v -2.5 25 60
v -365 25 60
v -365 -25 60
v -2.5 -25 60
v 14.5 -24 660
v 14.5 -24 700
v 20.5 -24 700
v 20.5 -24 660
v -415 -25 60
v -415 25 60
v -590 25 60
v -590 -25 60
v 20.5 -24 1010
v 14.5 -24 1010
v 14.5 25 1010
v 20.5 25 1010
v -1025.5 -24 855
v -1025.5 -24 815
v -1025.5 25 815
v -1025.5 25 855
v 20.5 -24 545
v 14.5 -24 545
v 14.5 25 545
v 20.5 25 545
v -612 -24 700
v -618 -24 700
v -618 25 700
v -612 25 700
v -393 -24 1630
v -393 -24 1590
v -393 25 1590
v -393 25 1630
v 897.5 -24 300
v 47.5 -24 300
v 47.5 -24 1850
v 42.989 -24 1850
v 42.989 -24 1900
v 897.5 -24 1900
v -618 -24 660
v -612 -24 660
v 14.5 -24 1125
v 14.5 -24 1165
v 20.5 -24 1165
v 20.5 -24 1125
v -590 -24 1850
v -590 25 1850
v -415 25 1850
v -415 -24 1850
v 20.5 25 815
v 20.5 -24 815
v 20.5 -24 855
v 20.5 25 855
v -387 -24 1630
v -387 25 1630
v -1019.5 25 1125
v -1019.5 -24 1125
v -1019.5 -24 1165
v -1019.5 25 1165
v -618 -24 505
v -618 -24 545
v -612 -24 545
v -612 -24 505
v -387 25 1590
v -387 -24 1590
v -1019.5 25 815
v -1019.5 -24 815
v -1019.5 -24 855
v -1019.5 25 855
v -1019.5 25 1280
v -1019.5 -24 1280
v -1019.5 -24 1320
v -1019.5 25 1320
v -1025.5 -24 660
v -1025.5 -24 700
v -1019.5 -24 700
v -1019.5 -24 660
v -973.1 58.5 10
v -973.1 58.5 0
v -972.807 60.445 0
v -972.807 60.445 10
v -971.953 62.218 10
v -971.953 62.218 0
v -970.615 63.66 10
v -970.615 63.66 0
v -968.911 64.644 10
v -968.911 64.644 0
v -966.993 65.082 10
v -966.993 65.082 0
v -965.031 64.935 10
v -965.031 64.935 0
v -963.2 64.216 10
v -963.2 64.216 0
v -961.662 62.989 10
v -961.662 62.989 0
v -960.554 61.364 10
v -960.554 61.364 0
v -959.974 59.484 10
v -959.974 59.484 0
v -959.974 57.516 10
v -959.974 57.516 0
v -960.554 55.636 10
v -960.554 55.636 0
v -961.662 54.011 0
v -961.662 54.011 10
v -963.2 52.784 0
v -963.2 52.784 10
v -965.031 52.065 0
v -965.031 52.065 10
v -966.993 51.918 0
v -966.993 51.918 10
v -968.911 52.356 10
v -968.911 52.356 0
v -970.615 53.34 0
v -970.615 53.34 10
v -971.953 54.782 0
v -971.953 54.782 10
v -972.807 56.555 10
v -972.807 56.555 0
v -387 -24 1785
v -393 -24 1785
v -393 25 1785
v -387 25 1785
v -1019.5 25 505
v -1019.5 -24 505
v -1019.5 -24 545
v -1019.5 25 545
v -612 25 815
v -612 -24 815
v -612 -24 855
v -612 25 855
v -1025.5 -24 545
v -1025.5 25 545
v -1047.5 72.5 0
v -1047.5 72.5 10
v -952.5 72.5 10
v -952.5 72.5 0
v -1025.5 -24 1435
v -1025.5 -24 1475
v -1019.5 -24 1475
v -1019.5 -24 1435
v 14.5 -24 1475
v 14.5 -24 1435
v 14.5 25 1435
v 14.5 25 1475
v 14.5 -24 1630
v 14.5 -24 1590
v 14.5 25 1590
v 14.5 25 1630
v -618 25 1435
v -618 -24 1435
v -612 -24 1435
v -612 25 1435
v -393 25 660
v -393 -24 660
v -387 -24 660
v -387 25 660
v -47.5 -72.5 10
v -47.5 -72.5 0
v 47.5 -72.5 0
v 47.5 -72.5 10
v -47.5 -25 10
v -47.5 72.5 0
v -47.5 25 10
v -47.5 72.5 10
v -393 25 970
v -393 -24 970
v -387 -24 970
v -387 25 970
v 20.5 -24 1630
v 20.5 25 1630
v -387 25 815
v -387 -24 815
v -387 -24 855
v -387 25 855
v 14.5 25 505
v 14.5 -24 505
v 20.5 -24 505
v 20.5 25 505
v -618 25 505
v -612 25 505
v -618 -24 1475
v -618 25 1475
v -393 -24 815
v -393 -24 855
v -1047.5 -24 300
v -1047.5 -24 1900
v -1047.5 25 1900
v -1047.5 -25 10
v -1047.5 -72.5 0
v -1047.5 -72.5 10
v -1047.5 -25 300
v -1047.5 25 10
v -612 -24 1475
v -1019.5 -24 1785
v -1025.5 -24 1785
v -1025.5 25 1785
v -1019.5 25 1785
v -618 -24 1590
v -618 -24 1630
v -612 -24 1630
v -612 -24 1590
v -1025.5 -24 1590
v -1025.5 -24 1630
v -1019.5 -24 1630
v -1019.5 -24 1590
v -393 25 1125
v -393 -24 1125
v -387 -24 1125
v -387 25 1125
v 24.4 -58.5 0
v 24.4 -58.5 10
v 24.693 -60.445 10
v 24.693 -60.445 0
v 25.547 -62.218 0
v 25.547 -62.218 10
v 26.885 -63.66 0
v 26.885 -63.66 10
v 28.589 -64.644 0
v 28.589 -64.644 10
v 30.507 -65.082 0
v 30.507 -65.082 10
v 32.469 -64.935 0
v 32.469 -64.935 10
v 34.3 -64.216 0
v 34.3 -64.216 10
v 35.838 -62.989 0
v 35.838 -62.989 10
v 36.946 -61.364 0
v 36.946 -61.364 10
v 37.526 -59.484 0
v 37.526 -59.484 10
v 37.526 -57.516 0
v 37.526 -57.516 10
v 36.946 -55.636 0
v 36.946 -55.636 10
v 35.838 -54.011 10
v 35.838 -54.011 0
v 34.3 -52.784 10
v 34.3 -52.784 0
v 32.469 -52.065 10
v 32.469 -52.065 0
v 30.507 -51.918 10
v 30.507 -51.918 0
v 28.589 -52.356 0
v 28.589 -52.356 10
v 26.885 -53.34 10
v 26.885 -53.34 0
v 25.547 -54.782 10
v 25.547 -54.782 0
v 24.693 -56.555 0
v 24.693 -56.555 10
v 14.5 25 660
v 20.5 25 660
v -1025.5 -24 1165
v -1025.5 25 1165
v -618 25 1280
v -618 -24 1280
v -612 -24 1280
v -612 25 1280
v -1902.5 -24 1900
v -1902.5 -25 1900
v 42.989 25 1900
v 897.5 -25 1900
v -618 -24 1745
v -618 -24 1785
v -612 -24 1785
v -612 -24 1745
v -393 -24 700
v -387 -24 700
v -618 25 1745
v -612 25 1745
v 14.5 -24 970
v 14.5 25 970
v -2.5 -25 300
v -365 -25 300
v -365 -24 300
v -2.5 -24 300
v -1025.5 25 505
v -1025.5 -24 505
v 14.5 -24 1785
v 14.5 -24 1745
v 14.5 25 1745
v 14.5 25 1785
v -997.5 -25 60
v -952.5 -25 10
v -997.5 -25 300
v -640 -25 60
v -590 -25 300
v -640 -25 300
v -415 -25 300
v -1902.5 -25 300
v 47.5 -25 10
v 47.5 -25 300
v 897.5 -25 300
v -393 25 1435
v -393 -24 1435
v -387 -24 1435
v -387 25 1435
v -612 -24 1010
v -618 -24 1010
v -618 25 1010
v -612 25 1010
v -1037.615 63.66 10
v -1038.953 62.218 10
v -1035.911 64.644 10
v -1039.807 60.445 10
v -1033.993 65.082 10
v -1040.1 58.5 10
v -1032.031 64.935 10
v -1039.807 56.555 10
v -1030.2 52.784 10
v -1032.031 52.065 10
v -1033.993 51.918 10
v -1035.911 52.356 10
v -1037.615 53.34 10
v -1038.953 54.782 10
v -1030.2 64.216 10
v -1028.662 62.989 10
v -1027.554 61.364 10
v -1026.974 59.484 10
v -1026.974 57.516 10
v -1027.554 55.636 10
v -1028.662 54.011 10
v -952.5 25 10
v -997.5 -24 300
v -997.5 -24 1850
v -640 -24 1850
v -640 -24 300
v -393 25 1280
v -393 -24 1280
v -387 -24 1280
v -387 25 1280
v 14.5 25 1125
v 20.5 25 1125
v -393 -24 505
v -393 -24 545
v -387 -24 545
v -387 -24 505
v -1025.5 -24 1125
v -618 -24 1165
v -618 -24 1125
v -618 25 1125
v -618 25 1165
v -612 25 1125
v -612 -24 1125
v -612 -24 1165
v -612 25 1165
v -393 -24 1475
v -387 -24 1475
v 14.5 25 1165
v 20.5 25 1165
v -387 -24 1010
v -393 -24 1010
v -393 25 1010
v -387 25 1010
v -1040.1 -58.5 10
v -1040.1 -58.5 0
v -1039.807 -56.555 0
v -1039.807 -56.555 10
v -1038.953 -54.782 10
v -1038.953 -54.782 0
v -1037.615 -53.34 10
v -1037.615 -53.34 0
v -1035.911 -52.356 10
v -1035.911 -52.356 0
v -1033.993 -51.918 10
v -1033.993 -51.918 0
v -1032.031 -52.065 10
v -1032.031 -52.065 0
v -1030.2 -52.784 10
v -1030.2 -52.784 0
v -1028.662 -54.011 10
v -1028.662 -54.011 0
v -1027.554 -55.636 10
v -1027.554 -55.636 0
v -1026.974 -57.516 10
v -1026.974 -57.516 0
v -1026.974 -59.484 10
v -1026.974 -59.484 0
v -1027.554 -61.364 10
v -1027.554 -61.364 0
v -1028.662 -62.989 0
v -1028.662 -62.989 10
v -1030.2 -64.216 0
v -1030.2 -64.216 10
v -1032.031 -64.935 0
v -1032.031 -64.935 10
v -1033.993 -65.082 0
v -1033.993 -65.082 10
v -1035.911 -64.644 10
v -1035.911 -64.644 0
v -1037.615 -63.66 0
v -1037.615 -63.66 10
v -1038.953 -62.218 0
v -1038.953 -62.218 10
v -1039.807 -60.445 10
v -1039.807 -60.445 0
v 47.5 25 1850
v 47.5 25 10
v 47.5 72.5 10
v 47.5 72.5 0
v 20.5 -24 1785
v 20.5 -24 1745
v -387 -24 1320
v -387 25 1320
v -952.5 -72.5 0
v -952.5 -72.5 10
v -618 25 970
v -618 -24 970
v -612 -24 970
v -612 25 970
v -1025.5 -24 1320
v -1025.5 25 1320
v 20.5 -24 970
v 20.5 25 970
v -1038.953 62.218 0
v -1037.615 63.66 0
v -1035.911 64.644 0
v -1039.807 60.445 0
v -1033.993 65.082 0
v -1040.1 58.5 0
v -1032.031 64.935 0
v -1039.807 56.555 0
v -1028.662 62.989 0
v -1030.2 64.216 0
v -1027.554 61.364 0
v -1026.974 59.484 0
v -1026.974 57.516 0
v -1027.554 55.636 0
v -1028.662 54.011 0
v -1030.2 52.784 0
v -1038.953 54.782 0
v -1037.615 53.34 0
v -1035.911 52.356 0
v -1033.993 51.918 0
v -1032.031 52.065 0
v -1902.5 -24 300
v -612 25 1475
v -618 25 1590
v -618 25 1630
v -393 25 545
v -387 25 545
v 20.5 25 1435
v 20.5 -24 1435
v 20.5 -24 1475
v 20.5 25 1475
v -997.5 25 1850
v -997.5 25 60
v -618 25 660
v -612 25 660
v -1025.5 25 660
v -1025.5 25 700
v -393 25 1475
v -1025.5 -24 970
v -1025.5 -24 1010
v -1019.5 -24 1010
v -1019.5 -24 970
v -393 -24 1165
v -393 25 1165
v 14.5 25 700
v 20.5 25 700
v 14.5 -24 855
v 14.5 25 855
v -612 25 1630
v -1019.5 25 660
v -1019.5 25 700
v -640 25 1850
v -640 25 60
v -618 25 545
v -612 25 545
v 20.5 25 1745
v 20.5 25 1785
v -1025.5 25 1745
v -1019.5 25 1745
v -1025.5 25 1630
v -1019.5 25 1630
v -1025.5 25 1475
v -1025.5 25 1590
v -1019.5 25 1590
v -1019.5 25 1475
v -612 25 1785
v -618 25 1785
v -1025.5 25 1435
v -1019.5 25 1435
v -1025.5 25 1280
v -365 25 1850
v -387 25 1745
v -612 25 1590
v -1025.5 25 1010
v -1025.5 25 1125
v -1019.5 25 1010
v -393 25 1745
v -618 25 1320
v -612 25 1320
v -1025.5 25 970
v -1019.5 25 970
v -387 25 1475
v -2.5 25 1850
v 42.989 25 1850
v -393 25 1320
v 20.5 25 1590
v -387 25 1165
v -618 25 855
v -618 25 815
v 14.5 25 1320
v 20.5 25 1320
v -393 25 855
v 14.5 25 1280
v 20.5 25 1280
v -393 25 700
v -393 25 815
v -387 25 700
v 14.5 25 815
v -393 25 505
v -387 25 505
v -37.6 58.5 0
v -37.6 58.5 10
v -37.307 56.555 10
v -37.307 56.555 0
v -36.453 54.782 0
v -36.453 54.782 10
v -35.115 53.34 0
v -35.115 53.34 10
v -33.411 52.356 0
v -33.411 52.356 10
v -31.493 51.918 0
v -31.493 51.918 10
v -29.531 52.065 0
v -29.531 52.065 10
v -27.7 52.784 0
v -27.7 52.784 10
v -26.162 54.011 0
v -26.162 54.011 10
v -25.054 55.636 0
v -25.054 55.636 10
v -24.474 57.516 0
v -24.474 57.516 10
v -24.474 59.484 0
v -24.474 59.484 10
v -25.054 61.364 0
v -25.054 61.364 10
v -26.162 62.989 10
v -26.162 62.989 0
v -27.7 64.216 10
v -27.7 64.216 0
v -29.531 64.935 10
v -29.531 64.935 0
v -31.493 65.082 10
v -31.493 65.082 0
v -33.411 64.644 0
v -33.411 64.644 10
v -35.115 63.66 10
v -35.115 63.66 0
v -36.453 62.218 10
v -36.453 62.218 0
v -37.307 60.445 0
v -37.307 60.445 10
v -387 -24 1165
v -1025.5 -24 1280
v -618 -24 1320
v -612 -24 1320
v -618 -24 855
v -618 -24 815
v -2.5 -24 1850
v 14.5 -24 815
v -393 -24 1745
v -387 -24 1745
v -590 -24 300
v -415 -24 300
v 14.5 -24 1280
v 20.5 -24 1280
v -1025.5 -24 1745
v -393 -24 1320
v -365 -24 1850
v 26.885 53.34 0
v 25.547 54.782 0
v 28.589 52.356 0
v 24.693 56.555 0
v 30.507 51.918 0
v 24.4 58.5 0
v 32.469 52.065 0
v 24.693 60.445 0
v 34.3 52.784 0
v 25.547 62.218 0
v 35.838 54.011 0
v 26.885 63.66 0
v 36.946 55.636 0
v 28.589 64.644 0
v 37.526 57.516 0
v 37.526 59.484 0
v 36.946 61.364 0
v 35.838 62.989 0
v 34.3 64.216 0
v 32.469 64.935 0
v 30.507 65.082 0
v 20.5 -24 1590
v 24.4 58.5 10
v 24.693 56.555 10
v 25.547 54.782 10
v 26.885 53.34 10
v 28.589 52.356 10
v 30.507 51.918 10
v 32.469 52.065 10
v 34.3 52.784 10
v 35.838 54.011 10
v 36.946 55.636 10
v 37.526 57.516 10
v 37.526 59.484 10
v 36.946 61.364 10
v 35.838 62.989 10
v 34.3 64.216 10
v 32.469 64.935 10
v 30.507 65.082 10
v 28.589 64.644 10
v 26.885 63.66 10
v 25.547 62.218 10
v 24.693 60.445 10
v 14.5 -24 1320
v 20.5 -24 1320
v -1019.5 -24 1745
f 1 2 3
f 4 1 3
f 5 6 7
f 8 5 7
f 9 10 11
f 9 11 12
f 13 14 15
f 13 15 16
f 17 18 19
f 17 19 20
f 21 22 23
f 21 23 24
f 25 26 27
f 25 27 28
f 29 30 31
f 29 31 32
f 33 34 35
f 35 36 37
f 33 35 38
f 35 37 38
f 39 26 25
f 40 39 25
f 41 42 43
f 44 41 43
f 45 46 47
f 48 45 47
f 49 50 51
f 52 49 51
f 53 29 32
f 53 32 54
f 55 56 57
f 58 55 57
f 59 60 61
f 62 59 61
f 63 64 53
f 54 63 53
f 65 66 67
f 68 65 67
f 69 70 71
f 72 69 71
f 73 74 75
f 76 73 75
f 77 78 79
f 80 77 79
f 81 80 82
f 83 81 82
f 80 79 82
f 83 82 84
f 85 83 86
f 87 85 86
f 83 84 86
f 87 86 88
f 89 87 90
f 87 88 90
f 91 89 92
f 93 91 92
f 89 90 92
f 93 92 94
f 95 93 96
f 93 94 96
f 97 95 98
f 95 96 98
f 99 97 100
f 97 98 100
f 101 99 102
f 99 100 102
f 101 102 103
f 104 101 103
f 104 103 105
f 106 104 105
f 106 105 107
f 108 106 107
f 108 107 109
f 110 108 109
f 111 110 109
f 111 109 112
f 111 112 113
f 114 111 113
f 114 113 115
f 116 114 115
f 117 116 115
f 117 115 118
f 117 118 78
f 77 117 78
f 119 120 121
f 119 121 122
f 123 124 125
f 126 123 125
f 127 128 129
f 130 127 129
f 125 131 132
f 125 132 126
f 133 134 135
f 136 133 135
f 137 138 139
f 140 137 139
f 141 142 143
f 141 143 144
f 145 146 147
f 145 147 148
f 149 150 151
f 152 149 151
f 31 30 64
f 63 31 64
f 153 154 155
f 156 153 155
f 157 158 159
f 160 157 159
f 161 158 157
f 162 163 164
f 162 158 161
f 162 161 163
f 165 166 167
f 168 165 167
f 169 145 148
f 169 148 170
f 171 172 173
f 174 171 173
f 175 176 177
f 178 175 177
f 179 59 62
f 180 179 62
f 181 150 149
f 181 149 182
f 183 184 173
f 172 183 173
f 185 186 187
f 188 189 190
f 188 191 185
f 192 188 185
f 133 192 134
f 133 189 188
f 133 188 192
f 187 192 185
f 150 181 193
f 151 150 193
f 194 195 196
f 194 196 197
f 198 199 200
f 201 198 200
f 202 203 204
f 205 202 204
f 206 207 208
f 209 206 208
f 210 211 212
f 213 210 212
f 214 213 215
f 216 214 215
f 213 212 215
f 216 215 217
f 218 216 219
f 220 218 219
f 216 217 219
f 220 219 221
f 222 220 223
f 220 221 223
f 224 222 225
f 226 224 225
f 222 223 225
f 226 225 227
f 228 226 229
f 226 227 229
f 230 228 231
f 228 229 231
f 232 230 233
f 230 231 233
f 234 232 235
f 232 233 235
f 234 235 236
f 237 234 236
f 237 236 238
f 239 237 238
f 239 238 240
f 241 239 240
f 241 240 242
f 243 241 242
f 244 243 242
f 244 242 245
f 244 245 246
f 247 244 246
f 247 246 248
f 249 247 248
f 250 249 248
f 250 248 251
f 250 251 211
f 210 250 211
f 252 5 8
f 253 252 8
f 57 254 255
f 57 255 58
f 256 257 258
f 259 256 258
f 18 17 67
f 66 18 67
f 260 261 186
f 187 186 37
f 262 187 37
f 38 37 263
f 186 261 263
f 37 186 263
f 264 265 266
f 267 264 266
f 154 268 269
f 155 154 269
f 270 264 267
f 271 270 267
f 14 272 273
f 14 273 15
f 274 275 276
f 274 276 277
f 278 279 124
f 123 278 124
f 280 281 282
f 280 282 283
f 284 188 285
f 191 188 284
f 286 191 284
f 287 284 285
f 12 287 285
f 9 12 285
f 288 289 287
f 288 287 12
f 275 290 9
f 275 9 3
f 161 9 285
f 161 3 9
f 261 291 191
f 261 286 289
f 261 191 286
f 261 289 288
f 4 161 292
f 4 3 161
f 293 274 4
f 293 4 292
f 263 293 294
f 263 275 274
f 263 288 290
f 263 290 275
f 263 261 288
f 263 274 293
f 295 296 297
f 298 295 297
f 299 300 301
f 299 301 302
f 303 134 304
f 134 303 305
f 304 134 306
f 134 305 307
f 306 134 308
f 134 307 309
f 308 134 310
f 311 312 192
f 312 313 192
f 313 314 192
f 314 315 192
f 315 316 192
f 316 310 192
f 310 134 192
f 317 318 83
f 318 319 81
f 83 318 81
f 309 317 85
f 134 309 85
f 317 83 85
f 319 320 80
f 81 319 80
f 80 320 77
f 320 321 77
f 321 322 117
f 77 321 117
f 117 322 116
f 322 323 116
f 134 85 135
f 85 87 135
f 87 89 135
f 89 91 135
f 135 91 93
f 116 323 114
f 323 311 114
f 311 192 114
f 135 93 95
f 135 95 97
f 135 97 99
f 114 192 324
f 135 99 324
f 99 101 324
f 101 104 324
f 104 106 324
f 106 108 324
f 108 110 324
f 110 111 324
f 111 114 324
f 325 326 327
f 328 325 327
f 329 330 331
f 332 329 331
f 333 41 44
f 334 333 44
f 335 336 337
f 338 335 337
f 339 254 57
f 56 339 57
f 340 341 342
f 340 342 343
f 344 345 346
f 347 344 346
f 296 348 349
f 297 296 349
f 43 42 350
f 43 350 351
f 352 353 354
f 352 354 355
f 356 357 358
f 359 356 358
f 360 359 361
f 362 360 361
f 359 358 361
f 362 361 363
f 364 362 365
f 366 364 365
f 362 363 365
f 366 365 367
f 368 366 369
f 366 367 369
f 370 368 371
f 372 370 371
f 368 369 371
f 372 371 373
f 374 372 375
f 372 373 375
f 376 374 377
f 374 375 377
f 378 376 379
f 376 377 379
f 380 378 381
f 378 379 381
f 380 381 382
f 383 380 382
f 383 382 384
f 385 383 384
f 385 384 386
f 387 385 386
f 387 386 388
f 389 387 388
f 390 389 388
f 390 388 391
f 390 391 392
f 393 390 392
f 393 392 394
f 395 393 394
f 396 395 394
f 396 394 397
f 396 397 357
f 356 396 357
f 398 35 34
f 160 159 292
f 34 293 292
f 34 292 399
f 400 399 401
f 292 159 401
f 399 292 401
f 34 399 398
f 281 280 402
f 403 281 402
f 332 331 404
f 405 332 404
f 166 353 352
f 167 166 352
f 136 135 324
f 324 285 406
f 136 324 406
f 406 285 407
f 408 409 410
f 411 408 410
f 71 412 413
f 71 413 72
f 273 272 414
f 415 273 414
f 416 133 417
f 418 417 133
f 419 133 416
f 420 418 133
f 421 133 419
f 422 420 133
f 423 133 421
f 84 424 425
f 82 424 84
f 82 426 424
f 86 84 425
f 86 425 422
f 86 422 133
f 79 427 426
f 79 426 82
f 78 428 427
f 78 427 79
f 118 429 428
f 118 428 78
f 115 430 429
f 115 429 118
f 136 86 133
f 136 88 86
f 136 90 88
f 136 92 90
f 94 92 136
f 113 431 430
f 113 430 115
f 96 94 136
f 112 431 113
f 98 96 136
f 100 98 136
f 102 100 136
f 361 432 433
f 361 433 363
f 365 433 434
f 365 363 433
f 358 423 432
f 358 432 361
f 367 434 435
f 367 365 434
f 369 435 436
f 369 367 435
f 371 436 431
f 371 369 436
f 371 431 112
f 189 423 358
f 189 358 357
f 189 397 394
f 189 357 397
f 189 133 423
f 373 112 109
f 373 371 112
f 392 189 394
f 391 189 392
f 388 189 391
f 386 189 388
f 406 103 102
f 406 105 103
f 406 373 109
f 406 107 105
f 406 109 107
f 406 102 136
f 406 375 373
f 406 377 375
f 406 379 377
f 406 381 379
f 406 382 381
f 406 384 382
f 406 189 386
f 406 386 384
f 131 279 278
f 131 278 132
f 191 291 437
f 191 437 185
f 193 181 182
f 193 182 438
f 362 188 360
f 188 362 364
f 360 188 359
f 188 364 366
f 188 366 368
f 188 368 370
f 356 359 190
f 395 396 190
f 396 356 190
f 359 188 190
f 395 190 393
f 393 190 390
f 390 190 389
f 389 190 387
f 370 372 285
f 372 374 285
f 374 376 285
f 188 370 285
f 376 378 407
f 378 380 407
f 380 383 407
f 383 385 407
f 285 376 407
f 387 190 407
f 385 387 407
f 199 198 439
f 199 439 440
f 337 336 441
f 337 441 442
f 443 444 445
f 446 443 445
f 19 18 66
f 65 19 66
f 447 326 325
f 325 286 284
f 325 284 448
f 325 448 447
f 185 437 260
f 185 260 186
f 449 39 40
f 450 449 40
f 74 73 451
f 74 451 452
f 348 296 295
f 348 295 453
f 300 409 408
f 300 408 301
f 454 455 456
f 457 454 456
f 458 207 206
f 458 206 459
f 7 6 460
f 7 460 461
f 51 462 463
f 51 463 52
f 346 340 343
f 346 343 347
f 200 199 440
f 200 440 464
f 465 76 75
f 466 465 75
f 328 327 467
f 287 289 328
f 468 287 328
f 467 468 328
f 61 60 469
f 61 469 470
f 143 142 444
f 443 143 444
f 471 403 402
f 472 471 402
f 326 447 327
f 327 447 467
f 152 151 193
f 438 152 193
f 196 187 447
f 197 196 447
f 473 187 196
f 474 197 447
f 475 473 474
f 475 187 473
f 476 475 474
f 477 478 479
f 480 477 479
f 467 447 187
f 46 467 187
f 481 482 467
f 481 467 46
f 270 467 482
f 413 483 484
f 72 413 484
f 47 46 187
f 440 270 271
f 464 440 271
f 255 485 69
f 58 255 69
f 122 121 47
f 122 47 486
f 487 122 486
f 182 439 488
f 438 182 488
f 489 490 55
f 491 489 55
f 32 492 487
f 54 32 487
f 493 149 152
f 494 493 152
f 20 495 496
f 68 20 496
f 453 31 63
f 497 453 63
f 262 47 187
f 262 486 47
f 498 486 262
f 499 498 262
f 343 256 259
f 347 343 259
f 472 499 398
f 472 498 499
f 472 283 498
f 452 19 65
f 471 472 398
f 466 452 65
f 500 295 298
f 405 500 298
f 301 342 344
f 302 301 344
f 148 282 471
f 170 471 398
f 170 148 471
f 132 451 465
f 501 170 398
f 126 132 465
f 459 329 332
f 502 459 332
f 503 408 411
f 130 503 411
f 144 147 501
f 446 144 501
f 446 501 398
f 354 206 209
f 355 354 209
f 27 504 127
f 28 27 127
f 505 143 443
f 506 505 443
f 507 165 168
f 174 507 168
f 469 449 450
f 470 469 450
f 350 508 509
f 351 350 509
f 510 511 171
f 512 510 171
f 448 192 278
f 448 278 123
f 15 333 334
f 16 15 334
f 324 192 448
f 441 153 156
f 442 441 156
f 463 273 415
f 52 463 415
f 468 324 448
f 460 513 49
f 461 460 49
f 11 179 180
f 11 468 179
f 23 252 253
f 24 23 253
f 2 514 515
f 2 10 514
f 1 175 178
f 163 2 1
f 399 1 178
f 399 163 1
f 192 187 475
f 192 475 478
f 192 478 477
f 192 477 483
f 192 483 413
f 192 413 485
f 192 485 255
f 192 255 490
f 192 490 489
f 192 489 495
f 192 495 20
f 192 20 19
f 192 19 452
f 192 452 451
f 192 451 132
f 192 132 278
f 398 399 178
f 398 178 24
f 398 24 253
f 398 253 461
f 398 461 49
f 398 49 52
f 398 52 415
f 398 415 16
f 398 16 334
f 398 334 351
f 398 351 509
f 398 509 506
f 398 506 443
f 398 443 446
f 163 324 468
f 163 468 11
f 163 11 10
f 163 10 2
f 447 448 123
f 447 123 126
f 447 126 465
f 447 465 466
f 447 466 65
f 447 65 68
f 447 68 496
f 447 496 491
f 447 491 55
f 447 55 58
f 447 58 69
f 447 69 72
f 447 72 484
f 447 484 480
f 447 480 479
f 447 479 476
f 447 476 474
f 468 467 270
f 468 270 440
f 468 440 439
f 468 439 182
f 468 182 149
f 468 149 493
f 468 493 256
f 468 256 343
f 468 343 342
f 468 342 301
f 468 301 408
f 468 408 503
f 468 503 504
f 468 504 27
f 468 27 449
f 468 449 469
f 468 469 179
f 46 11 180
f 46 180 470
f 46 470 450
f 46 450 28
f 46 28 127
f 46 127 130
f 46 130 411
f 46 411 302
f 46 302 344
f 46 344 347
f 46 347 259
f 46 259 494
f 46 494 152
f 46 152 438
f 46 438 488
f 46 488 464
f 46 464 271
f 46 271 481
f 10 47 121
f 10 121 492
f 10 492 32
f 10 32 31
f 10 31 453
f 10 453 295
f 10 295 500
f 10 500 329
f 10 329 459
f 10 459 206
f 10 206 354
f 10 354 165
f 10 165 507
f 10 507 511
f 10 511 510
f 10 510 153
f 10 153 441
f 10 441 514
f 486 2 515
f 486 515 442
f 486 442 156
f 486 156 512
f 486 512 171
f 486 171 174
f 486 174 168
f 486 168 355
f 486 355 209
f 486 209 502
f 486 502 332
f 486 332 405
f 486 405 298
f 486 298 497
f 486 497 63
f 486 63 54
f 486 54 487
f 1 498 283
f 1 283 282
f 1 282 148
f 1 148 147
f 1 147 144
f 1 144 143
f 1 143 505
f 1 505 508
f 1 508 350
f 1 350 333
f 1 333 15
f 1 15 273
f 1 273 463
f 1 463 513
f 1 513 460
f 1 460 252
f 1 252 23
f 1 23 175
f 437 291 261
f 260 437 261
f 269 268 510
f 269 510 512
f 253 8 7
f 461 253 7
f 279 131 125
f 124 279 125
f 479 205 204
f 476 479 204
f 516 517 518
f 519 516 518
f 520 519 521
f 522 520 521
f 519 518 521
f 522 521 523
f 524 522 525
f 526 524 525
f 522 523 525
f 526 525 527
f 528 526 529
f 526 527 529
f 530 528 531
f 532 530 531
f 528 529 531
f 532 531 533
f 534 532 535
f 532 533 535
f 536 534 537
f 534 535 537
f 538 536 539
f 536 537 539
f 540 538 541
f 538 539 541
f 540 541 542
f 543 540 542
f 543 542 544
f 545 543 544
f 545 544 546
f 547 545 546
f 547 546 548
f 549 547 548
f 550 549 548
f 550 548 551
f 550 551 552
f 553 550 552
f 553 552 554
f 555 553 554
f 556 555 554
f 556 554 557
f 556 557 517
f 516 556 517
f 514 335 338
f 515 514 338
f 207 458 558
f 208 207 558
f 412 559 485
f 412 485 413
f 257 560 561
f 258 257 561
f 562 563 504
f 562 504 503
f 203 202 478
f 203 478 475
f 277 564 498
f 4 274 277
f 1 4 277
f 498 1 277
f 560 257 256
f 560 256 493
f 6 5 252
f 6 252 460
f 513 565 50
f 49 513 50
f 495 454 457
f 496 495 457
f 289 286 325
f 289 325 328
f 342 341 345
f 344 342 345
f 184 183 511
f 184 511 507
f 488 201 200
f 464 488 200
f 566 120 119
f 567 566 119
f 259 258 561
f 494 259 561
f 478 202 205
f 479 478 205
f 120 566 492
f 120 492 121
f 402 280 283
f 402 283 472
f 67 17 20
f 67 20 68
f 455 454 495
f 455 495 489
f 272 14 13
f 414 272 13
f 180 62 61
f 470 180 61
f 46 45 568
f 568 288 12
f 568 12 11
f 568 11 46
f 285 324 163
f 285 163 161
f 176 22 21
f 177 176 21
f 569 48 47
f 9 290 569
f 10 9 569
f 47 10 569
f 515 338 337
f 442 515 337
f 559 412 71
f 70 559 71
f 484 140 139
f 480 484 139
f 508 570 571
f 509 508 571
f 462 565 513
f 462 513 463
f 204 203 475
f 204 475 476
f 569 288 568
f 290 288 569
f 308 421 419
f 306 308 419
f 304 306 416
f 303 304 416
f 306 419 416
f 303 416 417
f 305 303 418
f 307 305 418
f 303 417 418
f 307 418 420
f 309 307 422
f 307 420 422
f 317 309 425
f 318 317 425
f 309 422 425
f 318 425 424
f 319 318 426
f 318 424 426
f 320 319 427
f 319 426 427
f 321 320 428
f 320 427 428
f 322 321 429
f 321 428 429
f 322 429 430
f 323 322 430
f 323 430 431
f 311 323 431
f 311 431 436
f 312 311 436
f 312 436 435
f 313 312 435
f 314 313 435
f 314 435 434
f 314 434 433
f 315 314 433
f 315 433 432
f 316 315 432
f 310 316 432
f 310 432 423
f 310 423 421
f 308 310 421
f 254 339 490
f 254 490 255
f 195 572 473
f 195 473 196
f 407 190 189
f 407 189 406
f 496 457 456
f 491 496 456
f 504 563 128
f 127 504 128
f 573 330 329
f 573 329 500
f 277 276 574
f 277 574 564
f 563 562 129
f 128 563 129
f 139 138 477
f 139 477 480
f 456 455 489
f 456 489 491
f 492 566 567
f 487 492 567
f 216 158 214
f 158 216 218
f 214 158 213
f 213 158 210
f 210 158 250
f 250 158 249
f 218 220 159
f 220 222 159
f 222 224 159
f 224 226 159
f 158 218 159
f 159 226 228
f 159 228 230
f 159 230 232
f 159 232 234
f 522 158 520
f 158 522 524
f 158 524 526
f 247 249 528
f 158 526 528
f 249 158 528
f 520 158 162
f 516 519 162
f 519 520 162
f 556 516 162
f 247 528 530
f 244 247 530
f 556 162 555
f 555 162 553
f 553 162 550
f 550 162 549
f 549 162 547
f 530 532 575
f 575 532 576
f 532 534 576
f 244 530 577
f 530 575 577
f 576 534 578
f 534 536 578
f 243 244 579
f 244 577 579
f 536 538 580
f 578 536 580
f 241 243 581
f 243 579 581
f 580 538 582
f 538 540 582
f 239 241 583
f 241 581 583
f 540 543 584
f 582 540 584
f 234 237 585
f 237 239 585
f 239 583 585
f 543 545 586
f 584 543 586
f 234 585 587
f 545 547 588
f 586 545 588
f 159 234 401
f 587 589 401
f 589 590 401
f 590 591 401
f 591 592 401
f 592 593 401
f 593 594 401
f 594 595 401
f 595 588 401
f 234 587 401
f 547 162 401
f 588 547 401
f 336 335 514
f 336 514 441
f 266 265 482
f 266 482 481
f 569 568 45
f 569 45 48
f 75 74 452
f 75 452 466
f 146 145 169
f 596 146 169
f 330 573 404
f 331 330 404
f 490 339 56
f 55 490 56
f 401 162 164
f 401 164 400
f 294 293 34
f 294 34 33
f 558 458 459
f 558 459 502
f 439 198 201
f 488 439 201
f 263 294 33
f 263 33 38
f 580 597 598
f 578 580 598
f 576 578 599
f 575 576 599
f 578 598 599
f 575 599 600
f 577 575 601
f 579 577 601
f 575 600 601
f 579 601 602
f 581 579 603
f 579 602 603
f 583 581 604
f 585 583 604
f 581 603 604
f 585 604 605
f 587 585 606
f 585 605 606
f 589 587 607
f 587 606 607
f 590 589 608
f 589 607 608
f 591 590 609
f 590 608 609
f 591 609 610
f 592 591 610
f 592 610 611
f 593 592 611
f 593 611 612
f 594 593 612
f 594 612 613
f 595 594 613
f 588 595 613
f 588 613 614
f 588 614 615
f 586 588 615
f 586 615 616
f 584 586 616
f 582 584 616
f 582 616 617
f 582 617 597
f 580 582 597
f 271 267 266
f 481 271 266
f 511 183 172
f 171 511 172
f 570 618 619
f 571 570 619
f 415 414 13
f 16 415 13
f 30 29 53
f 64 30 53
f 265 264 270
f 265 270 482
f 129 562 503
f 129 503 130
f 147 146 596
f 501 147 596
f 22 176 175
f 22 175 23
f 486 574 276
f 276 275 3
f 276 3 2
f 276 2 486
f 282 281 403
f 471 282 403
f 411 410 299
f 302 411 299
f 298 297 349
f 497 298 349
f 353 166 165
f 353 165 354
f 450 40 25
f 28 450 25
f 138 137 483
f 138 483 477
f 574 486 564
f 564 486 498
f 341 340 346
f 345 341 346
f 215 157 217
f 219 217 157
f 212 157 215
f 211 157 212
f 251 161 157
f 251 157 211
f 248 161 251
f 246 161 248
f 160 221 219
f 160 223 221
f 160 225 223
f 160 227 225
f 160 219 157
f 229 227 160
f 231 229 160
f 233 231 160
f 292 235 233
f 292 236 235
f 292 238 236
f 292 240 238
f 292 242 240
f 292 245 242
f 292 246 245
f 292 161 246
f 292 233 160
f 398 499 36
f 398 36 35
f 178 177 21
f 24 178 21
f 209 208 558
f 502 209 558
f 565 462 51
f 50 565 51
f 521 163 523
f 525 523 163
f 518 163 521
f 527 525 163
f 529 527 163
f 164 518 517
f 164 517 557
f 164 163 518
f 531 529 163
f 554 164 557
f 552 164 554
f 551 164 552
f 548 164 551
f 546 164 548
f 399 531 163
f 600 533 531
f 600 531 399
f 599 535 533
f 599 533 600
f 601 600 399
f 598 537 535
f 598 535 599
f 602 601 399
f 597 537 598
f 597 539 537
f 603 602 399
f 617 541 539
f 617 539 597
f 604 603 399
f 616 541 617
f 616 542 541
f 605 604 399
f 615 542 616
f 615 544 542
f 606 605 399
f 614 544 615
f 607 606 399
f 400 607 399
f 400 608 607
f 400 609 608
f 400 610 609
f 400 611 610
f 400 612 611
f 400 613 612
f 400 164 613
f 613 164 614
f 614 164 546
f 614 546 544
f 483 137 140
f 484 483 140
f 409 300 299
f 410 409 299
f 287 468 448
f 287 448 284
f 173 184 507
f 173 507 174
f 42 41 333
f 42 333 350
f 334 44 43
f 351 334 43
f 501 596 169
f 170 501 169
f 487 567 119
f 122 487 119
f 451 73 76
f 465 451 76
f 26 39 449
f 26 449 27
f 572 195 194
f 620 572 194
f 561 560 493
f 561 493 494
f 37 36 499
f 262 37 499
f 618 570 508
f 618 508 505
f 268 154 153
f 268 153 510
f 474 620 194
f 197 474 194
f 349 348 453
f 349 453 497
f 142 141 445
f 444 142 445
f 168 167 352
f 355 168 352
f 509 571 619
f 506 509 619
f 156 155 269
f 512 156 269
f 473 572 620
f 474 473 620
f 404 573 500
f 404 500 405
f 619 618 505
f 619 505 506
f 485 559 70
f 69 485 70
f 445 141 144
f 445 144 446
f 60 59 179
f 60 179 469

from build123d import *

# Parameters (mm, degrees)
F0_W      = 95
F0_H      = 145
F1_DEPTH  = 10
F3_D      = 13.2
F4_W      = 95
F4_H      = 50
F5_DEPTH  = 50
F6_W      = 50
F6_H      = 50
F7_DEPTH  = 1000
F8_W      = 95
F8_H      = 145
F9_DEPTH  = 10
F11_D     = 13.2
F12_W     = 50
F12_H     = 50
F13_DEPTH = 1790
F14_W     = 1090.4886555672
F14_H     = 50
F15_DEPTH = 50
F16_W     = 6
F16_H     = 40
F17_DEPTH = 97.501
F18_W     = 6
F18_H     = 40
F19_DEPTH = 97.501
F20_W     = 2800
F20_H     = 1600
F21_DEPTH = 1


with BuildPart() as f1:
    # F0 (on Top) → F1 (new body)
    with BuildSketch(Plane.XY):
        Rectangle(F0_W, F0_H)
    extrude(amount=F1_DEPTH)

    # F3 (through all)
    with Locations(Plane(origin=(0, 0, 0), x_dir=(1, 0, 0), z_dir=(0, 0, -1))):
        with Locations((31, -58.5), (31, 58.5), (-31, -58.5)):
            Hole(F3_D / 2)

    # F4 (on face) → F5 (join)
    with BuildSketch(Plane.XY.offset(10)):
        Rectangle(F4_W, F4_H)
    extrude(amount=F5_DEPTH)

    # F6 (on face) → F7 (join)
    with BuildSketch(Plane(origin=(-47.5, 0, 0), x_dir=(0, -1, 0), z_dir=(-1, 0, 0))):
        with Locations((0, 35)):
            Rectangle(F6_W, F6_H)
    extrude(amount=F7_DEPTH)

    # F8 (on face) → F9 (join)
    with BuildSketch(Plane(origin=(0, 0, 10), x_dir=(1, 0, 0), z_dir=(0, 0, -1))):
        with Locations((-1000, 0)):
            Rectangle(F8_W, F8_H)
    extrude(amount=F9_DEPTH)

    # F11 (through all)
    with Locations(Plane.XY.offset(10)):
        with Locations((-966.5, 58.5), (-1033.5, -58.5), (-1033.5, 58.5)):
            Hole(F11_D / 2)

    # F12 (on face) → F13 (join)
    with BuildSketch(Plane.XY.offset(60)):
        with Locations((22.5, 0)):
            Rectangle(F12_W, F12_H)
        with Locations((-390, 0)):
            Rectangle(F12_W, F12_H)
        with Locations((-1022.5, 0)):
            Rectangle(F12_W, F12_H)
        with Locations((-615, 0)):
            Rectangle(F12_W, F12_H)
    extrude(amount=F13_DEPTH)

    # F14 (on face) → F15 (join)
    with BuildSketch(Plane.XY.offset(1850)):
        with Locations((-502.2556722164, 0)):
            Rectangle(F14_W, F14_H)
    extrude(amount=F15_DEPTH)

    # F16 (on face) → F17 (cut, through all)
    with BuildSketch(Plane.XZ.offset(25)):
        with Locations((-1022.5, 525)):
            Rectangle(F16_W, F16_H)
        with Locations((-1022.5, 680)):
            Rectangle(F16_W, F16_H)
        with Locations((-1022.5, 835)):
            Rectangle(F16_W, F16_H)
        with Locations((-1022.5, 990)):
            Rectangle(F16_W, F16_H)
        with Locations((-1022.5, 1145)):
            Rectangle(F16_W, F16_H)
        with Locations((-1022.5, 1300)):
            Rectangle(F16_W, F16_H)
        with Locations((-1022.5, 1455)):
            Rectangle(F16_W, F16_H)
        with Locations((-1022.5, 1610)):
            Rectangle(F16_W, F16_H)
        with Locations((-1022.5, 1765)):
            Rectangle(F16_W, F16_H)
        with Locations((-615, 525)):
            Rectangle(F16_W, F16_H)
        with Locations((-615, 680)):
            Rectangle(F16_W, F16_H)
        with Locations((-615, 835)):
            Rectangle(F16_W, F16_H)
        with Locations((-615, 990)):
            Rectangle(F16_W, F16_H)
        with Locations((-615, 1145)):
            Rectangle(F16_W, F16_H)
        with Locations((-615, 1300)):
            Rectangle(F16_W, F16_H)
        with Locations((-615, 1455)):
            Rectangle(F16_W, F16_H)
        with Locations((-615, 1610)):
            Rectangle(F16_W, F16_H)
        with Locations((-615, 1765)):
            Rectangle(F16_W, F16_H)
    extrude(amount=-F17_DEPTH, mode=Mode.SUBTRACT)

    # F18 (on face) → F19 (cut, through all)
    with BuildSketch(Plane.XZ.offset(25)):
        with Locations((-390, 525)):
            Rectangle(F18_W, F18_H)
        with Locations((-390, 680)):
            Rectangle(F18_W, F18_H)
        with Locations((-390, 835)):
            Rectangle(F18_W, F18_H)
        with Locations((-390, 990)):
            Rectangle(F18_W, F18_H)
        with Locations((-390, 1145)):
            Rectangle(F18_W, F18_H)
        with Locations((-390, 1300)):
            Rectangle(F18_W, F18_H)
        with Locations((-390, 1455)):
            Rectangle(F18_W, F18_H)
        with Locations((-390, 1610)):
            Rectangle(F18_W, F18_H)
        with Locations((-390, 1765)):
            Rectangle(F18_W, F18_H)
        with Locations((17.5, 525)):
            Rectangle(F18_W, F18_H)
        with Locations((17.5, 680)):
            Rectangle(F18_W, F18_H)
        with Locations((17.5, 835)):
            Rectangle(F18_W, F18_H)
        with Locations((17.5, 990)):
            Rectangle(F18_W, F18_H)
        with Locations((17.5, 1145)):
            Rectangle(F18_W, F18_H)
        with Locations((17.5, 1300)):
            Rectangle(F18_W, F18_H)
        with Locations((17.5, 1455)):
            Rectangle(F18_W, F18_H)
        with Locations((17.5, 1610)):
            Rectangle(F18_W, F18_H)
        with Locations((17.5, 1765)):
            Rectangle(F18_W, F18_H)
    extrude(amount=-F19_DEPTH, mode=Mode.SUBTRACT)

    # F20 (on face) → F21 (join)
    with BuildSketch(Plane.XZ.offset(25)):
        with Locations((-502.5, 1100)):
            Rectangle(F20_W, F20_H)
    extrude(amount=-F21_DEPTH)


solid = f1.part
